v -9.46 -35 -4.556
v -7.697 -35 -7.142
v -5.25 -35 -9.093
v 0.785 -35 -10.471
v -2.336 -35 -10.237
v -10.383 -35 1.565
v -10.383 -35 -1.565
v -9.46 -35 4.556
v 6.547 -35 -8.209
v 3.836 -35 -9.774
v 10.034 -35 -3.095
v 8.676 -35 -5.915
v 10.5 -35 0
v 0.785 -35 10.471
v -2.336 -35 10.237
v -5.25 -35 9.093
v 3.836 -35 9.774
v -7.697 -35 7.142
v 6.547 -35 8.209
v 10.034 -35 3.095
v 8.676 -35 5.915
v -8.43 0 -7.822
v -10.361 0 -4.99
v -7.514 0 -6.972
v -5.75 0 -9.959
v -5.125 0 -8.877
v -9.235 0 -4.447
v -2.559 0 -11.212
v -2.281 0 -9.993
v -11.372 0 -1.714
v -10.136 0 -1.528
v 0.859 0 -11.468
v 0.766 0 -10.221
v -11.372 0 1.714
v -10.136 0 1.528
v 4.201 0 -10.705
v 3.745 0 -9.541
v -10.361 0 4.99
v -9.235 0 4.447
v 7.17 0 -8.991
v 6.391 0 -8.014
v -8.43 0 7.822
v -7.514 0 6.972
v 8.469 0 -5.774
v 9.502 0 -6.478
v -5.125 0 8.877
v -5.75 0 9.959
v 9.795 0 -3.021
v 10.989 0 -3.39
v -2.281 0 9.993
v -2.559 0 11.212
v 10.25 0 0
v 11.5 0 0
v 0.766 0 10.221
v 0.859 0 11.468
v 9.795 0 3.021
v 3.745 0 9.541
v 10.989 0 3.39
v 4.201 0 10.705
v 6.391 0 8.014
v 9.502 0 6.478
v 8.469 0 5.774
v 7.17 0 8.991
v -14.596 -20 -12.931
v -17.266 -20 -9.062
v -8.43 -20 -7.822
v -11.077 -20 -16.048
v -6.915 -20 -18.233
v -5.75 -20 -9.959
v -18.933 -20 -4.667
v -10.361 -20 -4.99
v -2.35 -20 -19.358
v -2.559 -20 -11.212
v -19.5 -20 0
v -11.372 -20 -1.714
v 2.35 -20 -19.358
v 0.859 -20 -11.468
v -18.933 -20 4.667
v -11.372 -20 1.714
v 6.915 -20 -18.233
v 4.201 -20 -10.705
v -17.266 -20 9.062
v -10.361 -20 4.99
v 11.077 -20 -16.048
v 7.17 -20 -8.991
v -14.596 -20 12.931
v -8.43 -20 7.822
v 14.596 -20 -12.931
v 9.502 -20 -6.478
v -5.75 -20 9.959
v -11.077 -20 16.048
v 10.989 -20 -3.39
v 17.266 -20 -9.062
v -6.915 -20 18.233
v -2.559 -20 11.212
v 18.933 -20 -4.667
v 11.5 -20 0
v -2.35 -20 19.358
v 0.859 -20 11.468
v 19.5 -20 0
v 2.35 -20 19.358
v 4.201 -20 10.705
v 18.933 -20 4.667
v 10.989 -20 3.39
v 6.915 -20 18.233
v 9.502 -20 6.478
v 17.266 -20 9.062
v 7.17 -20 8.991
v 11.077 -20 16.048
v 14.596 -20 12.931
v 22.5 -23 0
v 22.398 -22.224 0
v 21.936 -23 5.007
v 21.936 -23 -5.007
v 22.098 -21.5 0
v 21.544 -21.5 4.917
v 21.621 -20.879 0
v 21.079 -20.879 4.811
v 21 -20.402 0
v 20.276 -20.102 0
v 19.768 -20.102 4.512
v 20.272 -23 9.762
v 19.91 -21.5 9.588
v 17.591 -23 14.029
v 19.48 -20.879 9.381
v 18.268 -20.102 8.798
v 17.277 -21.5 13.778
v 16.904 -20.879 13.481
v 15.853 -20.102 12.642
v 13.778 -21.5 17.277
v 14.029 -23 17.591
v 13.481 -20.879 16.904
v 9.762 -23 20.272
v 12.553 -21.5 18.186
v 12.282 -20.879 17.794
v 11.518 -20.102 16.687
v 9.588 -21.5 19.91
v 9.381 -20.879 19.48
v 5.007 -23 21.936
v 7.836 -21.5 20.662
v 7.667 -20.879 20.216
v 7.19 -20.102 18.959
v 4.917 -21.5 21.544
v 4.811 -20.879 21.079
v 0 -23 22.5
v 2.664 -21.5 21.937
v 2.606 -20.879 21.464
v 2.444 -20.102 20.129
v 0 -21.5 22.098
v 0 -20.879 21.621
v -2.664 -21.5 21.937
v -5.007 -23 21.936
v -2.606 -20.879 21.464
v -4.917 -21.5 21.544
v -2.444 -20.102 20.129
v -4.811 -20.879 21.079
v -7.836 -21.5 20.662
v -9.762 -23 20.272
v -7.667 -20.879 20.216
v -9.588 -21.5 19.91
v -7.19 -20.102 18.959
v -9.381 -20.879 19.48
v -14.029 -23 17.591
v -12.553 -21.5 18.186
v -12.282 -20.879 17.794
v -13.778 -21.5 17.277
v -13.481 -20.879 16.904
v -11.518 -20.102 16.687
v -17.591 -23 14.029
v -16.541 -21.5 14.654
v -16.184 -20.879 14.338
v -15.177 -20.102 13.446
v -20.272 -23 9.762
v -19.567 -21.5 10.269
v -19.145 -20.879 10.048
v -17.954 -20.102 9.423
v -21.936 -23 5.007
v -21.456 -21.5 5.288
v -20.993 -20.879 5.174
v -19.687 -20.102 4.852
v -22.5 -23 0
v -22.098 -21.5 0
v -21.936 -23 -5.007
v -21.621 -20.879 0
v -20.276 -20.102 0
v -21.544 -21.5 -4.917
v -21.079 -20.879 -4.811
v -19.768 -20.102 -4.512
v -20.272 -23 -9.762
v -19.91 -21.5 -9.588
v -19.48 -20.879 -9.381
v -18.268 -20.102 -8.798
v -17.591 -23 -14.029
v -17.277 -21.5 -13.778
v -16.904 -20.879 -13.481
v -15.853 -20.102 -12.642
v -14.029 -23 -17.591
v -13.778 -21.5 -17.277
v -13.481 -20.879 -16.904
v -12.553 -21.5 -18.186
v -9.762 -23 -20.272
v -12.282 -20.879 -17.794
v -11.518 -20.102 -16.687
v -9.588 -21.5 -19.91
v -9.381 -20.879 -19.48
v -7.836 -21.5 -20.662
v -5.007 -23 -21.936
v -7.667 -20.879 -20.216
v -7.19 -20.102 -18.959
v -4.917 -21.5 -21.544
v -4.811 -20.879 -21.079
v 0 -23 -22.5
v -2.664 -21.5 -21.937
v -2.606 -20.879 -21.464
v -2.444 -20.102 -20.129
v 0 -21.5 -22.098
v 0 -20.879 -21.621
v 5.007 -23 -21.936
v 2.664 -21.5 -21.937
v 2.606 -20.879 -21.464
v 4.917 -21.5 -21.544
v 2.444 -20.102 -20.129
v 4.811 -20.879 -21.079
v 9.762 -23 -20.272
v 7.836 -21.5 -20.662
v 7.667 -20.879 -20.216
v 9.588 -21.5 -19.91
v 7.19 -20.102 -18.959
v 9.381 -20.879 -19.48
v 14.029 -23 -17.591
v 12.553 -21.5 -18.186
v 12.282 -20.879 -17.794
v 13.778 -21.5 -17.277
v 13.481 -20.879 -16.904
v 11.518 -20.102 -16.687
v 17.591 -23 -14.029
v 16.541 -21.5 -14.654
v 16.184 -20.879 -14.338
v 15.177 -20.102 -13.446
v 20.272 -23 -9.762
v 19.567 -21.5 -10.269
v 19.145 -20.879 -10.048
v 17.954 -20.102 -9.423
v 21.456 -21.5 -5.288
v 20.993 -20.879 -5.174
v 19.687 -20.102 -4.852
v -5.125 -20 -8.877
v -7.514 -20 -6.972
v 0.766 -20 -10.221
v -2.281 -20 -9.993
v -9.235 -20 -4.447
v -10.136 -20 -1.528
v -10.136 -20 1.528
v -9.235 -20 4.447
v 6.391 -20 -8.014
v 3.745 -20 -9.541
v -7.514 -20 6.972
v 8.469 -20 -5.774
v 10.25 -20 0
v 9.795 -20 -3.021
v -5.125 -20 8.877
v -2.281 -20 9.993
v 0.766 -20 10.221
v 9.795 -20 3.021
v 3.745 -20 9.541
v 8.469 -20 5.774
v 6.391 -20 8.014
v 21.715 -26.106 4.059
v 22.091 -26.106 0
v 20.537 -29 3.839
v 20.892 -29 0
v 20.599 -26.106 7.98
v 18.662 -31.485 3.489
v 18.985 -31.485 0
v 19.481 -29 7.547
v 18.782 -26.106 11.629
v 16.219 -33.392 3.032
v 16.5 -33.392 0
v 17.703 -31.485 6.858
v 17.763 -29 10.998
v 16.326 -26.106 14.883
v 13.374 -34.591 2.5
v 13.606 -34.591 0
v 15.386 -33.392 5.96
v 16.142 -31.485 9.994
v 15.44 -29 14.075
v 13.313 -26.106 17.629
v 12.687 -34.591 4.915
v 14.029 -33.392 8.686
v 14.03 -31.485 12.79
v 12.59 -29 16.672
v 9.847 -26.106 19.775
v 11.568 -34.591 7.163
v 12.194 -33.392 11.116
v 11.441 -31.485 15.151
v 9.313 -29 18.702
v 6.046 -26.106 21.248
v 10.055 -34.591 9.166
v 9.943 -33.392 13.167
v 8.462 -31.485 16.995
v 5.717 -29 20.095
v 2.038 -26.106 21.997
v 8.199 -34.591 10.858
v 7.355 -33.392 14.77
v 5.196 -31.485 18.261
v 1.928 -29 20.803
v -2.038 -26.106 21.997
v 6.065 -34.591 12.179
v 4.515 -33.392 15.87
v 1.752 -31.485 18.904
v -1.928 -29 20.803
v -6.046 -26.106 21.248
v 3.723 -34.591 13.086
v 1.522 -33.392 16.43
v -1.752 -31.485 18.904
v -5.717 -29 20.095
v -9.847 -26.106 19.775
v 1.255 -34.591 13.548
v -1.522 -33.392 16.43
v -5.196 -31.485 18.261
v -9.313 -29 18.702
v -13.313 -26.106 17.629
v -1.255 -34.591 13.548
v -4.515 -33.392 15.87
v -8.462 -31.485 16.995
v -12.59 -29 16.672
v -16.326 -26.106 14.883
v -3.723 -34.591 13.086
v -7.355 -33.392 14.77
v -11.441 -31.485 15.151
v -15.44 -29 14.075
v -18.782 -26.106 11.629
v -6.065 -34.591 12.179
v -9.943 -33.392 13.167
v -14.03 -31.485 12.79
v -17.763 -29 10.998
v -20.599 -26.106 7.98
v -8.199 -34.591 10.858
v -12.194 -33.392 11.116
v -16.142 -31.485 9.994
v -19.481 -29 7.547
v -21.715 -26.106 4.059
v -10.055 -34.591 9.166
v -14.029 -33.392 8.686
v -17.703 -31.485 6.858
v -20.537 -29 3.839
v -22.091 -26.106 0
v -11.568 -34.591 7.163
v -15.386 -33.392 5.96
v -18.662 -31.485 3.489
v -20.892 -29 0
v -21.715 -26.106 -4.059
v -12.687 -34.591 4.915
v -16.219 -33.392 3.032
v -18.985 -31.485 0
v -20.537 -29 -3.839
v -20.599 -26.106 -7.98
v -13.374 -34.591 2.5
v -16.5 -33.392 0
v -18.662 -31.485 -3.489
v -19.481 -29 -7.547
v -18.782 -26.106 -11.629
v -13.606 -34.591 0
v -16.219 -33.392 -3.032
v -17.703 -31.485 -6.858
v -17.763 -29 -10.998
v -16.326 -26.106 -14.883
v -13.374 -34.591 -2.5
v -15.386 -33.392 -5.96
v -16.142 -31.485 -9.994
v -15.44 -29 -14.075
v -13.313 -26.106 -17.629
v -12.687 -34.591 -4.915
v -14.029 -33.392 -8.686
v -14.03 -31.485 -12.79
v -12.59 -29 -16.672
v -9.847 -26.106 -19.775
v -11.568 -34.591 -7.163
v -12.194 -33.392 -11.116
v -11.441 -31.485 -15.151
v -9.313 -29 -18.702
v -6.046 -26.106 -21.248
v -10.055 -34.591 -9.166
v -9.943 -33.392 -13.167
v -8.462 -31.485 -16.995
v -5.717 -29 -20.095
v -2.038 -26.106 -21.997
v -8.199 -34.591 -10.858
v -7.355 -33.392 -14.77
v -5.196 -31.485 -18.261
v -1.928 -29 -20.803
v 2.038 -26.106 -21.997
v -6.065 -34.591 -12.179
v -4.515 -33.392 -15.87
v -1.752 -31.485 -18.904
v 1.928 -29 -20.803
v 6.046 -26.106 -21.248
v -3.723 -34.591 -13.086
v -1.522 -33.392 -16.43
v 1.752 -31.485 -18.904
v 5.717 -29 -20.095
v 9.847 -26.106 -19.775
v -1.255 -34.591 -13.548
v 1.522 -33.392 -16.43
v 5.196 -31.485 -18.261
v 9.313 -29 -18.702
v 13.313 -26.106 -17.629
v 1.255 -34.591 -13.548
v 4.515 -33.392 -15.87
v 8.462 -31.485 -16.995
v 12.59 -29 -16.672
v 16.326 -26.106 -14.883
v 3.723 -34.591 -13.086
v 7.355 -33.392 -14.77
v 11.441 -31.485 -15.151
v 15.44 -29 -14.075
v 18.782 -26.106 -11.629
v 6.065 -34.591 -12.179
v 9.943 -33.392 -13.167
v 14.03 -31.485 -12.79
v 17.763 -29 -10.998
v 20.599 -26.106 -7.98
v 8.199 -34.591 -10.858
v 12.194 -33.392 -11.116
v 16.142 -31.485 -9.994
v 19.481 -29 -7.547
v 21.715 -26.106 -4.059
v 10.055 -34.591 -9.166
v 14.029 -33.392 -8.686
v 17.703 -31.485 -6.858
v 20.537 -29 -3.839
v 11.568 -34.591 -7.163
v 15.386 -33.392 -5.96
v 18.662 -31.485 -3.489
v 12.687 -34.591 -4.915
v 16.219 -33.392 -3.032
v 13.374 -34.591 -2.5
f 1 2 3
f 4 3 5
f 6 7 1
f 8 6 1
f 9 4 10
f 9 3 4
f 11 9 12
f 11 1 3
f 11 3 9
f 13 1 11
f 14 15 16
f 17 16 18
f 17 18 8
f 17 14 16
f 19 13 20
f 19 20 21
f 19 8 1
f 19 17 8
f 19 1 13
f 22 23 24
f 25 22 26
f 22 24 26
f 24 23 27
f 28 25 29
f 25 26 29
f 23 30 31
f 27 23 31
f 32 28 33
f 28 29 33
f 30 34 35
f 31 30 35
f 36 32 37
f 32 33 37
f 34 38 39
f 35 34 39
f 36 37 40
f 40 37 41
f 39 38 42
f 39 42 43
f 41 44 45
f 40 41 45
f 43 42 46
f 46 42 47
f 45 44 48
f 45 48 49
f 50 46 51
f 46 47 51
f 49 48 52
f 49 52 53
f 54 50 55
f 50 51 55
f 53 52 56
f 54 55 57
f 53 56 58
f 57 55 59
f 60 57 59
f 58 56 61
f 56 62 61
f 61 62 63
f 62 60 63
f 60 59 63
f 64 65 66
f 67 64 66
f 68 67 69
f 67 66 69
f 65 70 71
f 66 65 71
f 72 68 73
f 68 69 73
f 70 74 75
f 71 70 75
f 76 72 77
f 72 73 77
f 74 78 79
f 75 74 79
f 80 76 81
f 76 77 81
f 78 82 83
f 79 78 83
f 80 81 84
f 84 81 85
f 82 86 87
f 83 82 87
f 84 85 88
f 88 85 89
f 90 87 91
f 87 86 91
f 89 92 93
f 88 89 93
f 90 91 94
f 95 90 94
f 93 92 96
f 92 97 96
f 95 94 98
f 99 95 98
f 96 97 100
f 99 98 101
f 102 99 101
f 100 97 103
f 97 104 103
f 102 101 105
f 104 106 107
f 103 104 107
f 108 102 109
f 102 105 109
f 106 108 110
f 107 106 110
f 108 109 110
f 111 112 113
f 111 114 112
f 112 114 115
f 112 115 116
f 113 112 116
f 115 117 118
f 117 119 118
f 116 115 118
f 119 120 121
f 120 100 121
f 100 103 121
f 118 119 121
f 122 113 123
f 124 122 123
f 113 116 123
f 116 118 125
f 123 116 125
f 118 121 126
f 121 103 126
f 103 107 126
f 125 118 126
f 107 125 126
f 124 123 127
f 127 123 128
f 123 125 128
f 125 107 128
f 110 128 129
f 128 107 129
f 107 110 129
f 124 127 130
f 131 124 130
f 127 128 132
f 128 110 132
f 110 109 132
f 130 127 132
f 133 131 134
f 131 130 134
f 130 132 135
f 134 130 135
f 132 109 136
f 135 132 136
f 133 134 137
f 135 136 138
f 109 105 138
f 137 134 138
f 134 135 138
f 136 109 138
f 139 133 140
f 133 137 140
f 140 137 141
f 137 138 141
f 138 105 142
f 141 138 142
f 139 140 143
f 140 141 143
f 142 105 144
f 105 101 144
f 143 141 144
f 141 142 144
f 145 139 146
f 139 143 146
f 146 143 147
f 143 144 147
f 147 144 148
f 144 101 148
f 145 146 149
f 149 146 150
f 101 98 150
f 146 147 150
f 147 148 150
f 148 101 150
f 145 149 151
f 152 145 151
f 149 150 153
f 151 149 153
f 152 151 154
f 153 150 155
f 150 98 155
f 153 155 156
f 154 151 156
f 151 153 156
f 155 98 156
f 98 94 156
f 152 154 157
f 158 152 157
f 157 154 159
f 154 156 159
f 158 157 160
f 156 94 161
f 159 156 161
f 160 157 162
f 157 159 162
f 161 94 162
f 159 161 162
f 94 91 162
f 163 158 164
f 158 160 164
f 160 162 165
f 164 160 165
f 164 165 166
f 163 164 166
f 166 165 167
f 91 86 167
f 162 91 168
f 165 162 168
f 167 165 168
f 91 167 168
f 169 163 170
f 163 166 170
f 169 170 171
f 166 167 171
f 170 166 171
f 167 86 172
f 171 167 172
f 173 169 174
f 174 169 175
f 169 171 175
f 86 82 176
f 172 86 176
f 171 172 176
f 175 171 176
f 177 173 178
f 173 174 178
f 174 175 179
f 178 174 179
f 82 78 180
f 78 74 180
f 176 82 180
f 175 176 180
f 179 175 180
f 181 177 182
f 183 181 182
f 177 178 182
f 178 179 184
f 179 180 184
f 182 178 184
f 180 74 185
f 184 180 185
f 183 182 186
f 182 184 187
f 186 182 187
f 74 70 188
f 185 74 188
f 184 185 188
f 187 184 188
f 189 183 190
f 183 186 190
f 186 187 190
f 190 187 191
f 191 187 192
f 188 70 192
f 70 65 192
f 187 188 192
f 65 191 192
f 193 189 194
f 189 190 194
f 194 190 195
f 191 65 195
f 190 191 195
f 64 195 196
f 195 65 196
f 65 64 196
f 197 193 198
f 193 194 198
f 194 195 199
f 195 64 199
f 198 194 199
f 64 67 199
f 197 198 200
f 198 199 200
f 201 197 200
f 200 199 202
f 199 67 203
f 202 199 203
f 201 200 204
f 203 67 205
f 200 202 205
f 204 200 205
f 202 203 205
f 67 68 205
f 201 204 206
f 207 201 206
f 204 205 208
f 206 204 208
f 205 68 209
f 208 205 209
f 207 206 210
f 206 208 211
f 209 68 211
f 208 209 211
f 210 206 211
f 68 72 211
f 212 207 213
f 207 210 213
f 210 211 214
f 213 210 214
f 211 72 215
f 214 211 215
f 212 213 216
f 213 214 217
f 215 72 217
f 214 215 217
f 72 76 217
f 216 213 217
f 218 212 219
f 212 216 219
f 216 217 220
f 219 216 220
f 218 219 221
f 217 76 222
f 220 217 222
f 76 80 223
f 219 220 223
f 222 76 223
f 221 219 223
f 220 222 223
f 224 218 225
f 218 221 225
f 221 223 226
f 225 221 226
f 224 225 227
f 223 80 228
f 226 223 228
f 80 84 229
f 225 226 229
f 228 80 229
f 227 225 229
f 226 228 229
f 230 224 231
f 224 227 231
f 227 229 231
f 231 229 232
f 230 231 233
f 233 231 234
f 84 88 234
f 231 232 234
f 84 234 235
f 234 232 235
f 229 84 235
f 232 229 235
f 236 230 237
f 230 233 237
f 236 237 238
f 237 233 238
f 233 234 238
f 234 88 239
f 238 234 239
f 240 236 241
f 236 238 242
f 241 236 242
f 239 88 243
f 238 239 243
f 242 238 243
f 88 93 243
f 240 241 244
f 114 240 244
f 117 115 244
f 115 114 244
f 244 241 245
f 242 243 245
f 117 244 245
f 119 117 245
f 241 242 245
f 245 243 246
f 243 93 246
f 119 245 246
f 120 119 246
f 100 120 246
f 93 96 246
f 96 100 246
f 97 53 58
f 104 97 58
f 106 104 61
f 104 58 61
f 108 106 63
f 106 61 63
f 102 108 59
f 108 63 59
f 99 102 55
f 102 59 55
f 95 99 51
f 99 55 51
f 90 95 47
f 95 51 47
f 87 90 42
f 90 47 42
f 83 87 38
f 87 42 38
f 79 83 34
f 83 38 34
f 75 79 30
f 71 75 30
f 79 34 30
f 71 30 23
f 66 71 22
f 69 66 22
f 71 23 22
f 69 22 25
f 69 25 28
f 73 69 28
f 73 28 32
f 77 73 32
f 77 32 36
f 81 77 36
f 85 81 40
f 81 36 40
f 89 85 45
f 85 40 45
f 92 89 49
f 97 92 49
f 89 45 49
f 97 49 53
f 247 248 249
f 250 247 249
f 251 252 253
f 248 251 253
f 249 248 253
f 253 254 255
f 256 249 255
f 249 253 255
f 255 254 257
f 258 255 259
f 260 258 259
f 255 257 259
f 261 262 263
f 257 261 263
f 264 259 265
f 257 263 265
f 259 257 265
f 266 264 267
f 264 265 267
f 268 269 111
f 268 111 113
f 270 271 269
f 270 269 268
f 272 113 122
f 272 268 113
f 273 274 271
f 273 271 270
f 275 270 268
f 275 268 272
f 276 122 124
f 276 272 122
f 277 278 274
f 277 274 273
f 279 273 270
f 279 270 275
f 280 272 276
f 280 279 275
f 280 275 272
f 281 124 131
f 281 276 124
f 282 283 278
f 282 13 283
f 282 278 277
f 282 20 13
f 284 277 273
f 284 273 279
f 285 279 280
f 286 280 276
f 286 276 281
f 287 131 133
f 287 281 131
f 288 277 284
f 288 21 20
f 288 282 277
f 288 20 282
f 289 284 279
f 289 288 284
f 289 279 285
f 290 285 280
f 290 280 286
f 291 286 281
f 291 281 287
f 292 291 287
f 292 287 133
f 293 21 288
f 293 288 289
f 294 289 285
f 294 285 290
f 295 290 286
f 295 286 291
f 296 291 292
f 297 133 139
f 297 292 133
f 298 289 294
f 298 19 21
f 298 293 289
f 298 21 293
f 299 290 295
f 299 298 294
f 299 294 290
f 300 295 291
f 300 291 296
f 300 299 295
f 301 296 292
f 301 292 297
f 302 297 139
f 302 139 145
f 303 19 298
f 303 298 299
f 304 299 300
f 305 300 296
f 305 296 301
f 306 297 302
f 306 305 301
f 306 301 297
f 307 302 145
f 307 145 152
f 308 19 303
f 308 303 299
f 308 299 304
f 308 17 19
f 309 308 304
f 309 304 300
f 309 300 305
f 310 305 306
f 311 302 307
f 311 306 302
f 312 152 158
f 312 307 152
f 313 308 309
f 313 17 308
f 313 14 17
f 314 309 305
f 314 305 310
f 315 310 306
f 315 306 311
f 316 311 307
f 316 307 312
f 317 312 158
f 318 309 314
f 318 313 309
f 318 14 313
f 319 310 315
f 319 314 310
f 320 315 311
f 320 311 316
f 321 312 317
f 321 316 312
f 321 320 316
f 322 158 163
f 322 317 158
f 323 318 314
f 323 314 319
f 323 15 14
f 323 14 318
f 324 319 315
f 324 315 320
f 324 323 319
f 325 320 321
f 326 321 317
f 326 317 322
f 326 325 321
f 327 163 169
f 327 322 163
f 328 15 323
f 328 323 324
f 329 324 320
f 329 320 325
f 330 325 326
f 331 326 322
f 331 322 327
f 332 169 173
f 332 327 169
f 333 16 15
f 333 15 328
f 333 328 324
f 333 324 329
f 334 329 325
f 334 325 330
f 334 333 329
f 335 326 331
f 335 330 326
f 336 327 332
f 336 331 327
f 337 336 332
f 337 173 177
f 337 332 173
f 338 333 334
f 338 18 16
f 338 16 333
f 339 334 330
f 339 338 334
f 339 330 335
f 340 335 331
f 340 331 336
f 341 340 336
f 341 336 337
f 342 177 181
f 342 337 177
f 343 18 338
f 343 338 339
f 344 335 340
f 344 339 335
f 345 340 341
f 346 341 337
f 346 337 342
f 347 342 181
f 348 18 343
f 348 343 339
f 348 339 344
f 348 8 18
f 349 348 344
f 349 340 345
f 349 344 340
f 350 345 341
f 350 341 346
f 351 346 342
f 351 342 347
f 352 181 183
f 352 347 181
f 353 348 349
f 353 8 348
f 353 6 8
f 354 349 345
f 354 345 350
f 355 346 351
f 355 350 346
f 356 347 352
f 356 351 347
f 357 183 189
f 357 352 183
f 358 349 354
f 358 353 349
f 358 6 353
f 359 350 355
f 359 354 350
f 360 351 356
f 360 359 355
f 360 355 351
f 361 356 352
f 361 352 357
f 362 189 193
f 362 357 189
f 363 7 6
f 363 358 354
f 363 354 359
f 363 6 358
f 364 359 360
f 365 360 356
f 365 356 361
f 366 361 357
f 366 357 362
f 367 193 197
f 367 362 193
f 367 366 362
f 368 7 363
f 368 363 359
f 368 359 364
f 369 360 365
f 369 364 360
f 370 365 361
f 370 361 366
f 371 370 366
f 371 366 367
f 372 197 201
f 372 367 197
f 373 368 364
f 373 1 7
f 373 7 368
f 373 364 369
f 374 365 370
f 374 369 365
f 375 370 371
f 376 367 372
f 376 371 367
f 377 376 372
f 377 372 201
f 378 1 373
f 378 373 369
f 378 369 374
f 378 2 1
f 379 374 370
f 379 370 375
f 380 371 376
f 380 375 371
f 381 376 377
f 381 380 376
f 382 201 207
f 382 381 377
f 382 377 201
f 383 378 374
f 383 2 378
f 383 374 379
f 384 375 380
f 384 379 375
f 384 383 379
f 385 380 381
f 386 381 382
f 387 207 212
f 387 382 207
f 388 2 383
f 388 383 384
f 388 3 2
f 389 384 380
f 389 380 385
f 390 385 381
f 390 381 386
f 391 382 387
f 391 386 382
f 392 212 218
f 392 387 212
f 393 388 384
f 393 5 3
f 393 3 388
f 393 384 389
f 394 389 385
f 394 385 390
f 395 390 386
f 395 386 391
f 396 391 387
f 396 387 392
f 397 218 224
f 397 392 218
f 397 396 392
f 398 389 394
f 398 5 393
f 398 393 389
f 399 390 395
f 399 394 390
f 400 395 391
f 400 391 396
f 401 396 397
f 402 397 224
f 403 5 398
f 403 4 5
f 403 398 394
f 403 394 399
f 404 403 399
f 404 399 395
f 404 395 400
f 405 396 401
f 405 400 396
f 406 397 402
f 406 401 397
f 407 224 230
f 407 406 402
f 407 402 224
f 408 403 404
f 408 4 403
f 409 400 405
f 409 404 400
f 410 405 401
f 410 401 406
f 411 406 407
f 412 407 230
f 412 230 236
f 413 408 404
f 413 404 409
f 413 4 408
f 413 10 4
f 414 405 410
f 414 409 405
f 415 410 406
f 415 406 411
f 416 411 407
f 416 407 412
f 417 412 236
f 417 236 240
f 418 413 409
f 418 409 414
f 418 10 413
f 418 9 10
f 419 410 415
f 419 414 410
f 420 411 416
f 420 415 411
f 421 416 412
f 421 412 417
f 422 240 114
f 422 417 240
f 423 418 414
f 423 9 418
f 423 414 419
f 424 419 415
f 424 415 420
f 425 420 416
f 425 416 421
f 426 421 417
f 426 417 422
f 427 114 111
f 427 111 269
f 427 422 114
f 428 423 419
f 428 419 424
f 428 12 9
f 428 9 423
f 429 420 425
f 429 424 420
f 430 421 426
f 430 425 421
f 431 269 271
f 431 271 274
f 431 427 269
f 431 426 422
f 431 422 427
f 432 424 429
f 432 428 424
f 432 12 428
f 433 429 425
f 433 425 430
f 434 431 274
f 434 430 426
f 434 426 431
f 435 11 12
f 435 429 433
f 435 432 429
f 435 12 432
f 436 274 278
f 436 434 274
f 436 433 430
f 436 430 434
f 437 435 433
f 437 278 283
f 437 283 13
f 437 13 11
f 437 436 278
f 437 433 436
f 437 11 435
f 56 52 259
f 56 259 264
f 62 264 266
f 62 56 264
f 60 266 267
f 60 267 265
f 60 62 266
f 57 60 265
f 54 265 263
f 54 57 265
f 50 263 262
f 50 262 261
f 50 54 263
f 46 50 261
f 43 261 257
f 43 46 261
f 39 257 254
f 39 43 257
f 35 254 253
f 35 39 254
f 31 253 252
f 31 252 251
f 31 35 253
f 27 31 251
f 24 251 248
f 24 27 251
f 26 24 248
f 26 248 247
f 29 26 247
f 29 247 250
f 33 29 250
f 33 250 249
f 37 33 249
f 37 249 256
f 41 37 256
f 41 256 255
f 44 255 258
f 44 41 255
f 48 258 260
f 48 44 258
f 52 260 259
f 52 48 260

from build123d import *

# Parameters (mm, degrees)
F0_R     = 11.5
F0_R_2   = 10.25
F1_DEPTH = 20
F2_R     = 22.5
F3_DEPTH = 15
F4_R     = 12
F5_R     = 2.99999


# Not quite as in the source:
# - a fillet or chamfer is up to 0.001 mm smaller than in the source, because OpenCascade refuses the exact size


with BuildPart() as f1:
    # F0 (on Front) → F1 (new body)
    with BuildSketch(Plane.XZ):
        Circle(F0_R)
        Circle(F0_R_2, mode=Mode.SUBTRACT)
    extrude(amount=F1_DEPTH)

    # F2 (on face) → F3 (join)
    with BuildSketch(Plane.XZ.offset(20)):
        Circle(F2_R)
    extrude(amount=F3_DEPTH)

    # F4
    f4_edges = [f1.edges().sort_by_distance(p)[0] for p in [
        (-22.5, -35, 0),
    ]]
    fillet(f4_edges, radius=F4_R)

    # F5 (radius 3 in the source; OpenCascade refuses exactly that, so slightly less here)
    f5_edges = [f1.edges().sort_by_distance(p)[0] for p in [
        (-10.5, -35, 0),
        (-22.5, -23, 0),
        (-22.5, -20, 0),
    ]]
    fillet(f5_edges, radius=F5_R)


solid = f1.part
